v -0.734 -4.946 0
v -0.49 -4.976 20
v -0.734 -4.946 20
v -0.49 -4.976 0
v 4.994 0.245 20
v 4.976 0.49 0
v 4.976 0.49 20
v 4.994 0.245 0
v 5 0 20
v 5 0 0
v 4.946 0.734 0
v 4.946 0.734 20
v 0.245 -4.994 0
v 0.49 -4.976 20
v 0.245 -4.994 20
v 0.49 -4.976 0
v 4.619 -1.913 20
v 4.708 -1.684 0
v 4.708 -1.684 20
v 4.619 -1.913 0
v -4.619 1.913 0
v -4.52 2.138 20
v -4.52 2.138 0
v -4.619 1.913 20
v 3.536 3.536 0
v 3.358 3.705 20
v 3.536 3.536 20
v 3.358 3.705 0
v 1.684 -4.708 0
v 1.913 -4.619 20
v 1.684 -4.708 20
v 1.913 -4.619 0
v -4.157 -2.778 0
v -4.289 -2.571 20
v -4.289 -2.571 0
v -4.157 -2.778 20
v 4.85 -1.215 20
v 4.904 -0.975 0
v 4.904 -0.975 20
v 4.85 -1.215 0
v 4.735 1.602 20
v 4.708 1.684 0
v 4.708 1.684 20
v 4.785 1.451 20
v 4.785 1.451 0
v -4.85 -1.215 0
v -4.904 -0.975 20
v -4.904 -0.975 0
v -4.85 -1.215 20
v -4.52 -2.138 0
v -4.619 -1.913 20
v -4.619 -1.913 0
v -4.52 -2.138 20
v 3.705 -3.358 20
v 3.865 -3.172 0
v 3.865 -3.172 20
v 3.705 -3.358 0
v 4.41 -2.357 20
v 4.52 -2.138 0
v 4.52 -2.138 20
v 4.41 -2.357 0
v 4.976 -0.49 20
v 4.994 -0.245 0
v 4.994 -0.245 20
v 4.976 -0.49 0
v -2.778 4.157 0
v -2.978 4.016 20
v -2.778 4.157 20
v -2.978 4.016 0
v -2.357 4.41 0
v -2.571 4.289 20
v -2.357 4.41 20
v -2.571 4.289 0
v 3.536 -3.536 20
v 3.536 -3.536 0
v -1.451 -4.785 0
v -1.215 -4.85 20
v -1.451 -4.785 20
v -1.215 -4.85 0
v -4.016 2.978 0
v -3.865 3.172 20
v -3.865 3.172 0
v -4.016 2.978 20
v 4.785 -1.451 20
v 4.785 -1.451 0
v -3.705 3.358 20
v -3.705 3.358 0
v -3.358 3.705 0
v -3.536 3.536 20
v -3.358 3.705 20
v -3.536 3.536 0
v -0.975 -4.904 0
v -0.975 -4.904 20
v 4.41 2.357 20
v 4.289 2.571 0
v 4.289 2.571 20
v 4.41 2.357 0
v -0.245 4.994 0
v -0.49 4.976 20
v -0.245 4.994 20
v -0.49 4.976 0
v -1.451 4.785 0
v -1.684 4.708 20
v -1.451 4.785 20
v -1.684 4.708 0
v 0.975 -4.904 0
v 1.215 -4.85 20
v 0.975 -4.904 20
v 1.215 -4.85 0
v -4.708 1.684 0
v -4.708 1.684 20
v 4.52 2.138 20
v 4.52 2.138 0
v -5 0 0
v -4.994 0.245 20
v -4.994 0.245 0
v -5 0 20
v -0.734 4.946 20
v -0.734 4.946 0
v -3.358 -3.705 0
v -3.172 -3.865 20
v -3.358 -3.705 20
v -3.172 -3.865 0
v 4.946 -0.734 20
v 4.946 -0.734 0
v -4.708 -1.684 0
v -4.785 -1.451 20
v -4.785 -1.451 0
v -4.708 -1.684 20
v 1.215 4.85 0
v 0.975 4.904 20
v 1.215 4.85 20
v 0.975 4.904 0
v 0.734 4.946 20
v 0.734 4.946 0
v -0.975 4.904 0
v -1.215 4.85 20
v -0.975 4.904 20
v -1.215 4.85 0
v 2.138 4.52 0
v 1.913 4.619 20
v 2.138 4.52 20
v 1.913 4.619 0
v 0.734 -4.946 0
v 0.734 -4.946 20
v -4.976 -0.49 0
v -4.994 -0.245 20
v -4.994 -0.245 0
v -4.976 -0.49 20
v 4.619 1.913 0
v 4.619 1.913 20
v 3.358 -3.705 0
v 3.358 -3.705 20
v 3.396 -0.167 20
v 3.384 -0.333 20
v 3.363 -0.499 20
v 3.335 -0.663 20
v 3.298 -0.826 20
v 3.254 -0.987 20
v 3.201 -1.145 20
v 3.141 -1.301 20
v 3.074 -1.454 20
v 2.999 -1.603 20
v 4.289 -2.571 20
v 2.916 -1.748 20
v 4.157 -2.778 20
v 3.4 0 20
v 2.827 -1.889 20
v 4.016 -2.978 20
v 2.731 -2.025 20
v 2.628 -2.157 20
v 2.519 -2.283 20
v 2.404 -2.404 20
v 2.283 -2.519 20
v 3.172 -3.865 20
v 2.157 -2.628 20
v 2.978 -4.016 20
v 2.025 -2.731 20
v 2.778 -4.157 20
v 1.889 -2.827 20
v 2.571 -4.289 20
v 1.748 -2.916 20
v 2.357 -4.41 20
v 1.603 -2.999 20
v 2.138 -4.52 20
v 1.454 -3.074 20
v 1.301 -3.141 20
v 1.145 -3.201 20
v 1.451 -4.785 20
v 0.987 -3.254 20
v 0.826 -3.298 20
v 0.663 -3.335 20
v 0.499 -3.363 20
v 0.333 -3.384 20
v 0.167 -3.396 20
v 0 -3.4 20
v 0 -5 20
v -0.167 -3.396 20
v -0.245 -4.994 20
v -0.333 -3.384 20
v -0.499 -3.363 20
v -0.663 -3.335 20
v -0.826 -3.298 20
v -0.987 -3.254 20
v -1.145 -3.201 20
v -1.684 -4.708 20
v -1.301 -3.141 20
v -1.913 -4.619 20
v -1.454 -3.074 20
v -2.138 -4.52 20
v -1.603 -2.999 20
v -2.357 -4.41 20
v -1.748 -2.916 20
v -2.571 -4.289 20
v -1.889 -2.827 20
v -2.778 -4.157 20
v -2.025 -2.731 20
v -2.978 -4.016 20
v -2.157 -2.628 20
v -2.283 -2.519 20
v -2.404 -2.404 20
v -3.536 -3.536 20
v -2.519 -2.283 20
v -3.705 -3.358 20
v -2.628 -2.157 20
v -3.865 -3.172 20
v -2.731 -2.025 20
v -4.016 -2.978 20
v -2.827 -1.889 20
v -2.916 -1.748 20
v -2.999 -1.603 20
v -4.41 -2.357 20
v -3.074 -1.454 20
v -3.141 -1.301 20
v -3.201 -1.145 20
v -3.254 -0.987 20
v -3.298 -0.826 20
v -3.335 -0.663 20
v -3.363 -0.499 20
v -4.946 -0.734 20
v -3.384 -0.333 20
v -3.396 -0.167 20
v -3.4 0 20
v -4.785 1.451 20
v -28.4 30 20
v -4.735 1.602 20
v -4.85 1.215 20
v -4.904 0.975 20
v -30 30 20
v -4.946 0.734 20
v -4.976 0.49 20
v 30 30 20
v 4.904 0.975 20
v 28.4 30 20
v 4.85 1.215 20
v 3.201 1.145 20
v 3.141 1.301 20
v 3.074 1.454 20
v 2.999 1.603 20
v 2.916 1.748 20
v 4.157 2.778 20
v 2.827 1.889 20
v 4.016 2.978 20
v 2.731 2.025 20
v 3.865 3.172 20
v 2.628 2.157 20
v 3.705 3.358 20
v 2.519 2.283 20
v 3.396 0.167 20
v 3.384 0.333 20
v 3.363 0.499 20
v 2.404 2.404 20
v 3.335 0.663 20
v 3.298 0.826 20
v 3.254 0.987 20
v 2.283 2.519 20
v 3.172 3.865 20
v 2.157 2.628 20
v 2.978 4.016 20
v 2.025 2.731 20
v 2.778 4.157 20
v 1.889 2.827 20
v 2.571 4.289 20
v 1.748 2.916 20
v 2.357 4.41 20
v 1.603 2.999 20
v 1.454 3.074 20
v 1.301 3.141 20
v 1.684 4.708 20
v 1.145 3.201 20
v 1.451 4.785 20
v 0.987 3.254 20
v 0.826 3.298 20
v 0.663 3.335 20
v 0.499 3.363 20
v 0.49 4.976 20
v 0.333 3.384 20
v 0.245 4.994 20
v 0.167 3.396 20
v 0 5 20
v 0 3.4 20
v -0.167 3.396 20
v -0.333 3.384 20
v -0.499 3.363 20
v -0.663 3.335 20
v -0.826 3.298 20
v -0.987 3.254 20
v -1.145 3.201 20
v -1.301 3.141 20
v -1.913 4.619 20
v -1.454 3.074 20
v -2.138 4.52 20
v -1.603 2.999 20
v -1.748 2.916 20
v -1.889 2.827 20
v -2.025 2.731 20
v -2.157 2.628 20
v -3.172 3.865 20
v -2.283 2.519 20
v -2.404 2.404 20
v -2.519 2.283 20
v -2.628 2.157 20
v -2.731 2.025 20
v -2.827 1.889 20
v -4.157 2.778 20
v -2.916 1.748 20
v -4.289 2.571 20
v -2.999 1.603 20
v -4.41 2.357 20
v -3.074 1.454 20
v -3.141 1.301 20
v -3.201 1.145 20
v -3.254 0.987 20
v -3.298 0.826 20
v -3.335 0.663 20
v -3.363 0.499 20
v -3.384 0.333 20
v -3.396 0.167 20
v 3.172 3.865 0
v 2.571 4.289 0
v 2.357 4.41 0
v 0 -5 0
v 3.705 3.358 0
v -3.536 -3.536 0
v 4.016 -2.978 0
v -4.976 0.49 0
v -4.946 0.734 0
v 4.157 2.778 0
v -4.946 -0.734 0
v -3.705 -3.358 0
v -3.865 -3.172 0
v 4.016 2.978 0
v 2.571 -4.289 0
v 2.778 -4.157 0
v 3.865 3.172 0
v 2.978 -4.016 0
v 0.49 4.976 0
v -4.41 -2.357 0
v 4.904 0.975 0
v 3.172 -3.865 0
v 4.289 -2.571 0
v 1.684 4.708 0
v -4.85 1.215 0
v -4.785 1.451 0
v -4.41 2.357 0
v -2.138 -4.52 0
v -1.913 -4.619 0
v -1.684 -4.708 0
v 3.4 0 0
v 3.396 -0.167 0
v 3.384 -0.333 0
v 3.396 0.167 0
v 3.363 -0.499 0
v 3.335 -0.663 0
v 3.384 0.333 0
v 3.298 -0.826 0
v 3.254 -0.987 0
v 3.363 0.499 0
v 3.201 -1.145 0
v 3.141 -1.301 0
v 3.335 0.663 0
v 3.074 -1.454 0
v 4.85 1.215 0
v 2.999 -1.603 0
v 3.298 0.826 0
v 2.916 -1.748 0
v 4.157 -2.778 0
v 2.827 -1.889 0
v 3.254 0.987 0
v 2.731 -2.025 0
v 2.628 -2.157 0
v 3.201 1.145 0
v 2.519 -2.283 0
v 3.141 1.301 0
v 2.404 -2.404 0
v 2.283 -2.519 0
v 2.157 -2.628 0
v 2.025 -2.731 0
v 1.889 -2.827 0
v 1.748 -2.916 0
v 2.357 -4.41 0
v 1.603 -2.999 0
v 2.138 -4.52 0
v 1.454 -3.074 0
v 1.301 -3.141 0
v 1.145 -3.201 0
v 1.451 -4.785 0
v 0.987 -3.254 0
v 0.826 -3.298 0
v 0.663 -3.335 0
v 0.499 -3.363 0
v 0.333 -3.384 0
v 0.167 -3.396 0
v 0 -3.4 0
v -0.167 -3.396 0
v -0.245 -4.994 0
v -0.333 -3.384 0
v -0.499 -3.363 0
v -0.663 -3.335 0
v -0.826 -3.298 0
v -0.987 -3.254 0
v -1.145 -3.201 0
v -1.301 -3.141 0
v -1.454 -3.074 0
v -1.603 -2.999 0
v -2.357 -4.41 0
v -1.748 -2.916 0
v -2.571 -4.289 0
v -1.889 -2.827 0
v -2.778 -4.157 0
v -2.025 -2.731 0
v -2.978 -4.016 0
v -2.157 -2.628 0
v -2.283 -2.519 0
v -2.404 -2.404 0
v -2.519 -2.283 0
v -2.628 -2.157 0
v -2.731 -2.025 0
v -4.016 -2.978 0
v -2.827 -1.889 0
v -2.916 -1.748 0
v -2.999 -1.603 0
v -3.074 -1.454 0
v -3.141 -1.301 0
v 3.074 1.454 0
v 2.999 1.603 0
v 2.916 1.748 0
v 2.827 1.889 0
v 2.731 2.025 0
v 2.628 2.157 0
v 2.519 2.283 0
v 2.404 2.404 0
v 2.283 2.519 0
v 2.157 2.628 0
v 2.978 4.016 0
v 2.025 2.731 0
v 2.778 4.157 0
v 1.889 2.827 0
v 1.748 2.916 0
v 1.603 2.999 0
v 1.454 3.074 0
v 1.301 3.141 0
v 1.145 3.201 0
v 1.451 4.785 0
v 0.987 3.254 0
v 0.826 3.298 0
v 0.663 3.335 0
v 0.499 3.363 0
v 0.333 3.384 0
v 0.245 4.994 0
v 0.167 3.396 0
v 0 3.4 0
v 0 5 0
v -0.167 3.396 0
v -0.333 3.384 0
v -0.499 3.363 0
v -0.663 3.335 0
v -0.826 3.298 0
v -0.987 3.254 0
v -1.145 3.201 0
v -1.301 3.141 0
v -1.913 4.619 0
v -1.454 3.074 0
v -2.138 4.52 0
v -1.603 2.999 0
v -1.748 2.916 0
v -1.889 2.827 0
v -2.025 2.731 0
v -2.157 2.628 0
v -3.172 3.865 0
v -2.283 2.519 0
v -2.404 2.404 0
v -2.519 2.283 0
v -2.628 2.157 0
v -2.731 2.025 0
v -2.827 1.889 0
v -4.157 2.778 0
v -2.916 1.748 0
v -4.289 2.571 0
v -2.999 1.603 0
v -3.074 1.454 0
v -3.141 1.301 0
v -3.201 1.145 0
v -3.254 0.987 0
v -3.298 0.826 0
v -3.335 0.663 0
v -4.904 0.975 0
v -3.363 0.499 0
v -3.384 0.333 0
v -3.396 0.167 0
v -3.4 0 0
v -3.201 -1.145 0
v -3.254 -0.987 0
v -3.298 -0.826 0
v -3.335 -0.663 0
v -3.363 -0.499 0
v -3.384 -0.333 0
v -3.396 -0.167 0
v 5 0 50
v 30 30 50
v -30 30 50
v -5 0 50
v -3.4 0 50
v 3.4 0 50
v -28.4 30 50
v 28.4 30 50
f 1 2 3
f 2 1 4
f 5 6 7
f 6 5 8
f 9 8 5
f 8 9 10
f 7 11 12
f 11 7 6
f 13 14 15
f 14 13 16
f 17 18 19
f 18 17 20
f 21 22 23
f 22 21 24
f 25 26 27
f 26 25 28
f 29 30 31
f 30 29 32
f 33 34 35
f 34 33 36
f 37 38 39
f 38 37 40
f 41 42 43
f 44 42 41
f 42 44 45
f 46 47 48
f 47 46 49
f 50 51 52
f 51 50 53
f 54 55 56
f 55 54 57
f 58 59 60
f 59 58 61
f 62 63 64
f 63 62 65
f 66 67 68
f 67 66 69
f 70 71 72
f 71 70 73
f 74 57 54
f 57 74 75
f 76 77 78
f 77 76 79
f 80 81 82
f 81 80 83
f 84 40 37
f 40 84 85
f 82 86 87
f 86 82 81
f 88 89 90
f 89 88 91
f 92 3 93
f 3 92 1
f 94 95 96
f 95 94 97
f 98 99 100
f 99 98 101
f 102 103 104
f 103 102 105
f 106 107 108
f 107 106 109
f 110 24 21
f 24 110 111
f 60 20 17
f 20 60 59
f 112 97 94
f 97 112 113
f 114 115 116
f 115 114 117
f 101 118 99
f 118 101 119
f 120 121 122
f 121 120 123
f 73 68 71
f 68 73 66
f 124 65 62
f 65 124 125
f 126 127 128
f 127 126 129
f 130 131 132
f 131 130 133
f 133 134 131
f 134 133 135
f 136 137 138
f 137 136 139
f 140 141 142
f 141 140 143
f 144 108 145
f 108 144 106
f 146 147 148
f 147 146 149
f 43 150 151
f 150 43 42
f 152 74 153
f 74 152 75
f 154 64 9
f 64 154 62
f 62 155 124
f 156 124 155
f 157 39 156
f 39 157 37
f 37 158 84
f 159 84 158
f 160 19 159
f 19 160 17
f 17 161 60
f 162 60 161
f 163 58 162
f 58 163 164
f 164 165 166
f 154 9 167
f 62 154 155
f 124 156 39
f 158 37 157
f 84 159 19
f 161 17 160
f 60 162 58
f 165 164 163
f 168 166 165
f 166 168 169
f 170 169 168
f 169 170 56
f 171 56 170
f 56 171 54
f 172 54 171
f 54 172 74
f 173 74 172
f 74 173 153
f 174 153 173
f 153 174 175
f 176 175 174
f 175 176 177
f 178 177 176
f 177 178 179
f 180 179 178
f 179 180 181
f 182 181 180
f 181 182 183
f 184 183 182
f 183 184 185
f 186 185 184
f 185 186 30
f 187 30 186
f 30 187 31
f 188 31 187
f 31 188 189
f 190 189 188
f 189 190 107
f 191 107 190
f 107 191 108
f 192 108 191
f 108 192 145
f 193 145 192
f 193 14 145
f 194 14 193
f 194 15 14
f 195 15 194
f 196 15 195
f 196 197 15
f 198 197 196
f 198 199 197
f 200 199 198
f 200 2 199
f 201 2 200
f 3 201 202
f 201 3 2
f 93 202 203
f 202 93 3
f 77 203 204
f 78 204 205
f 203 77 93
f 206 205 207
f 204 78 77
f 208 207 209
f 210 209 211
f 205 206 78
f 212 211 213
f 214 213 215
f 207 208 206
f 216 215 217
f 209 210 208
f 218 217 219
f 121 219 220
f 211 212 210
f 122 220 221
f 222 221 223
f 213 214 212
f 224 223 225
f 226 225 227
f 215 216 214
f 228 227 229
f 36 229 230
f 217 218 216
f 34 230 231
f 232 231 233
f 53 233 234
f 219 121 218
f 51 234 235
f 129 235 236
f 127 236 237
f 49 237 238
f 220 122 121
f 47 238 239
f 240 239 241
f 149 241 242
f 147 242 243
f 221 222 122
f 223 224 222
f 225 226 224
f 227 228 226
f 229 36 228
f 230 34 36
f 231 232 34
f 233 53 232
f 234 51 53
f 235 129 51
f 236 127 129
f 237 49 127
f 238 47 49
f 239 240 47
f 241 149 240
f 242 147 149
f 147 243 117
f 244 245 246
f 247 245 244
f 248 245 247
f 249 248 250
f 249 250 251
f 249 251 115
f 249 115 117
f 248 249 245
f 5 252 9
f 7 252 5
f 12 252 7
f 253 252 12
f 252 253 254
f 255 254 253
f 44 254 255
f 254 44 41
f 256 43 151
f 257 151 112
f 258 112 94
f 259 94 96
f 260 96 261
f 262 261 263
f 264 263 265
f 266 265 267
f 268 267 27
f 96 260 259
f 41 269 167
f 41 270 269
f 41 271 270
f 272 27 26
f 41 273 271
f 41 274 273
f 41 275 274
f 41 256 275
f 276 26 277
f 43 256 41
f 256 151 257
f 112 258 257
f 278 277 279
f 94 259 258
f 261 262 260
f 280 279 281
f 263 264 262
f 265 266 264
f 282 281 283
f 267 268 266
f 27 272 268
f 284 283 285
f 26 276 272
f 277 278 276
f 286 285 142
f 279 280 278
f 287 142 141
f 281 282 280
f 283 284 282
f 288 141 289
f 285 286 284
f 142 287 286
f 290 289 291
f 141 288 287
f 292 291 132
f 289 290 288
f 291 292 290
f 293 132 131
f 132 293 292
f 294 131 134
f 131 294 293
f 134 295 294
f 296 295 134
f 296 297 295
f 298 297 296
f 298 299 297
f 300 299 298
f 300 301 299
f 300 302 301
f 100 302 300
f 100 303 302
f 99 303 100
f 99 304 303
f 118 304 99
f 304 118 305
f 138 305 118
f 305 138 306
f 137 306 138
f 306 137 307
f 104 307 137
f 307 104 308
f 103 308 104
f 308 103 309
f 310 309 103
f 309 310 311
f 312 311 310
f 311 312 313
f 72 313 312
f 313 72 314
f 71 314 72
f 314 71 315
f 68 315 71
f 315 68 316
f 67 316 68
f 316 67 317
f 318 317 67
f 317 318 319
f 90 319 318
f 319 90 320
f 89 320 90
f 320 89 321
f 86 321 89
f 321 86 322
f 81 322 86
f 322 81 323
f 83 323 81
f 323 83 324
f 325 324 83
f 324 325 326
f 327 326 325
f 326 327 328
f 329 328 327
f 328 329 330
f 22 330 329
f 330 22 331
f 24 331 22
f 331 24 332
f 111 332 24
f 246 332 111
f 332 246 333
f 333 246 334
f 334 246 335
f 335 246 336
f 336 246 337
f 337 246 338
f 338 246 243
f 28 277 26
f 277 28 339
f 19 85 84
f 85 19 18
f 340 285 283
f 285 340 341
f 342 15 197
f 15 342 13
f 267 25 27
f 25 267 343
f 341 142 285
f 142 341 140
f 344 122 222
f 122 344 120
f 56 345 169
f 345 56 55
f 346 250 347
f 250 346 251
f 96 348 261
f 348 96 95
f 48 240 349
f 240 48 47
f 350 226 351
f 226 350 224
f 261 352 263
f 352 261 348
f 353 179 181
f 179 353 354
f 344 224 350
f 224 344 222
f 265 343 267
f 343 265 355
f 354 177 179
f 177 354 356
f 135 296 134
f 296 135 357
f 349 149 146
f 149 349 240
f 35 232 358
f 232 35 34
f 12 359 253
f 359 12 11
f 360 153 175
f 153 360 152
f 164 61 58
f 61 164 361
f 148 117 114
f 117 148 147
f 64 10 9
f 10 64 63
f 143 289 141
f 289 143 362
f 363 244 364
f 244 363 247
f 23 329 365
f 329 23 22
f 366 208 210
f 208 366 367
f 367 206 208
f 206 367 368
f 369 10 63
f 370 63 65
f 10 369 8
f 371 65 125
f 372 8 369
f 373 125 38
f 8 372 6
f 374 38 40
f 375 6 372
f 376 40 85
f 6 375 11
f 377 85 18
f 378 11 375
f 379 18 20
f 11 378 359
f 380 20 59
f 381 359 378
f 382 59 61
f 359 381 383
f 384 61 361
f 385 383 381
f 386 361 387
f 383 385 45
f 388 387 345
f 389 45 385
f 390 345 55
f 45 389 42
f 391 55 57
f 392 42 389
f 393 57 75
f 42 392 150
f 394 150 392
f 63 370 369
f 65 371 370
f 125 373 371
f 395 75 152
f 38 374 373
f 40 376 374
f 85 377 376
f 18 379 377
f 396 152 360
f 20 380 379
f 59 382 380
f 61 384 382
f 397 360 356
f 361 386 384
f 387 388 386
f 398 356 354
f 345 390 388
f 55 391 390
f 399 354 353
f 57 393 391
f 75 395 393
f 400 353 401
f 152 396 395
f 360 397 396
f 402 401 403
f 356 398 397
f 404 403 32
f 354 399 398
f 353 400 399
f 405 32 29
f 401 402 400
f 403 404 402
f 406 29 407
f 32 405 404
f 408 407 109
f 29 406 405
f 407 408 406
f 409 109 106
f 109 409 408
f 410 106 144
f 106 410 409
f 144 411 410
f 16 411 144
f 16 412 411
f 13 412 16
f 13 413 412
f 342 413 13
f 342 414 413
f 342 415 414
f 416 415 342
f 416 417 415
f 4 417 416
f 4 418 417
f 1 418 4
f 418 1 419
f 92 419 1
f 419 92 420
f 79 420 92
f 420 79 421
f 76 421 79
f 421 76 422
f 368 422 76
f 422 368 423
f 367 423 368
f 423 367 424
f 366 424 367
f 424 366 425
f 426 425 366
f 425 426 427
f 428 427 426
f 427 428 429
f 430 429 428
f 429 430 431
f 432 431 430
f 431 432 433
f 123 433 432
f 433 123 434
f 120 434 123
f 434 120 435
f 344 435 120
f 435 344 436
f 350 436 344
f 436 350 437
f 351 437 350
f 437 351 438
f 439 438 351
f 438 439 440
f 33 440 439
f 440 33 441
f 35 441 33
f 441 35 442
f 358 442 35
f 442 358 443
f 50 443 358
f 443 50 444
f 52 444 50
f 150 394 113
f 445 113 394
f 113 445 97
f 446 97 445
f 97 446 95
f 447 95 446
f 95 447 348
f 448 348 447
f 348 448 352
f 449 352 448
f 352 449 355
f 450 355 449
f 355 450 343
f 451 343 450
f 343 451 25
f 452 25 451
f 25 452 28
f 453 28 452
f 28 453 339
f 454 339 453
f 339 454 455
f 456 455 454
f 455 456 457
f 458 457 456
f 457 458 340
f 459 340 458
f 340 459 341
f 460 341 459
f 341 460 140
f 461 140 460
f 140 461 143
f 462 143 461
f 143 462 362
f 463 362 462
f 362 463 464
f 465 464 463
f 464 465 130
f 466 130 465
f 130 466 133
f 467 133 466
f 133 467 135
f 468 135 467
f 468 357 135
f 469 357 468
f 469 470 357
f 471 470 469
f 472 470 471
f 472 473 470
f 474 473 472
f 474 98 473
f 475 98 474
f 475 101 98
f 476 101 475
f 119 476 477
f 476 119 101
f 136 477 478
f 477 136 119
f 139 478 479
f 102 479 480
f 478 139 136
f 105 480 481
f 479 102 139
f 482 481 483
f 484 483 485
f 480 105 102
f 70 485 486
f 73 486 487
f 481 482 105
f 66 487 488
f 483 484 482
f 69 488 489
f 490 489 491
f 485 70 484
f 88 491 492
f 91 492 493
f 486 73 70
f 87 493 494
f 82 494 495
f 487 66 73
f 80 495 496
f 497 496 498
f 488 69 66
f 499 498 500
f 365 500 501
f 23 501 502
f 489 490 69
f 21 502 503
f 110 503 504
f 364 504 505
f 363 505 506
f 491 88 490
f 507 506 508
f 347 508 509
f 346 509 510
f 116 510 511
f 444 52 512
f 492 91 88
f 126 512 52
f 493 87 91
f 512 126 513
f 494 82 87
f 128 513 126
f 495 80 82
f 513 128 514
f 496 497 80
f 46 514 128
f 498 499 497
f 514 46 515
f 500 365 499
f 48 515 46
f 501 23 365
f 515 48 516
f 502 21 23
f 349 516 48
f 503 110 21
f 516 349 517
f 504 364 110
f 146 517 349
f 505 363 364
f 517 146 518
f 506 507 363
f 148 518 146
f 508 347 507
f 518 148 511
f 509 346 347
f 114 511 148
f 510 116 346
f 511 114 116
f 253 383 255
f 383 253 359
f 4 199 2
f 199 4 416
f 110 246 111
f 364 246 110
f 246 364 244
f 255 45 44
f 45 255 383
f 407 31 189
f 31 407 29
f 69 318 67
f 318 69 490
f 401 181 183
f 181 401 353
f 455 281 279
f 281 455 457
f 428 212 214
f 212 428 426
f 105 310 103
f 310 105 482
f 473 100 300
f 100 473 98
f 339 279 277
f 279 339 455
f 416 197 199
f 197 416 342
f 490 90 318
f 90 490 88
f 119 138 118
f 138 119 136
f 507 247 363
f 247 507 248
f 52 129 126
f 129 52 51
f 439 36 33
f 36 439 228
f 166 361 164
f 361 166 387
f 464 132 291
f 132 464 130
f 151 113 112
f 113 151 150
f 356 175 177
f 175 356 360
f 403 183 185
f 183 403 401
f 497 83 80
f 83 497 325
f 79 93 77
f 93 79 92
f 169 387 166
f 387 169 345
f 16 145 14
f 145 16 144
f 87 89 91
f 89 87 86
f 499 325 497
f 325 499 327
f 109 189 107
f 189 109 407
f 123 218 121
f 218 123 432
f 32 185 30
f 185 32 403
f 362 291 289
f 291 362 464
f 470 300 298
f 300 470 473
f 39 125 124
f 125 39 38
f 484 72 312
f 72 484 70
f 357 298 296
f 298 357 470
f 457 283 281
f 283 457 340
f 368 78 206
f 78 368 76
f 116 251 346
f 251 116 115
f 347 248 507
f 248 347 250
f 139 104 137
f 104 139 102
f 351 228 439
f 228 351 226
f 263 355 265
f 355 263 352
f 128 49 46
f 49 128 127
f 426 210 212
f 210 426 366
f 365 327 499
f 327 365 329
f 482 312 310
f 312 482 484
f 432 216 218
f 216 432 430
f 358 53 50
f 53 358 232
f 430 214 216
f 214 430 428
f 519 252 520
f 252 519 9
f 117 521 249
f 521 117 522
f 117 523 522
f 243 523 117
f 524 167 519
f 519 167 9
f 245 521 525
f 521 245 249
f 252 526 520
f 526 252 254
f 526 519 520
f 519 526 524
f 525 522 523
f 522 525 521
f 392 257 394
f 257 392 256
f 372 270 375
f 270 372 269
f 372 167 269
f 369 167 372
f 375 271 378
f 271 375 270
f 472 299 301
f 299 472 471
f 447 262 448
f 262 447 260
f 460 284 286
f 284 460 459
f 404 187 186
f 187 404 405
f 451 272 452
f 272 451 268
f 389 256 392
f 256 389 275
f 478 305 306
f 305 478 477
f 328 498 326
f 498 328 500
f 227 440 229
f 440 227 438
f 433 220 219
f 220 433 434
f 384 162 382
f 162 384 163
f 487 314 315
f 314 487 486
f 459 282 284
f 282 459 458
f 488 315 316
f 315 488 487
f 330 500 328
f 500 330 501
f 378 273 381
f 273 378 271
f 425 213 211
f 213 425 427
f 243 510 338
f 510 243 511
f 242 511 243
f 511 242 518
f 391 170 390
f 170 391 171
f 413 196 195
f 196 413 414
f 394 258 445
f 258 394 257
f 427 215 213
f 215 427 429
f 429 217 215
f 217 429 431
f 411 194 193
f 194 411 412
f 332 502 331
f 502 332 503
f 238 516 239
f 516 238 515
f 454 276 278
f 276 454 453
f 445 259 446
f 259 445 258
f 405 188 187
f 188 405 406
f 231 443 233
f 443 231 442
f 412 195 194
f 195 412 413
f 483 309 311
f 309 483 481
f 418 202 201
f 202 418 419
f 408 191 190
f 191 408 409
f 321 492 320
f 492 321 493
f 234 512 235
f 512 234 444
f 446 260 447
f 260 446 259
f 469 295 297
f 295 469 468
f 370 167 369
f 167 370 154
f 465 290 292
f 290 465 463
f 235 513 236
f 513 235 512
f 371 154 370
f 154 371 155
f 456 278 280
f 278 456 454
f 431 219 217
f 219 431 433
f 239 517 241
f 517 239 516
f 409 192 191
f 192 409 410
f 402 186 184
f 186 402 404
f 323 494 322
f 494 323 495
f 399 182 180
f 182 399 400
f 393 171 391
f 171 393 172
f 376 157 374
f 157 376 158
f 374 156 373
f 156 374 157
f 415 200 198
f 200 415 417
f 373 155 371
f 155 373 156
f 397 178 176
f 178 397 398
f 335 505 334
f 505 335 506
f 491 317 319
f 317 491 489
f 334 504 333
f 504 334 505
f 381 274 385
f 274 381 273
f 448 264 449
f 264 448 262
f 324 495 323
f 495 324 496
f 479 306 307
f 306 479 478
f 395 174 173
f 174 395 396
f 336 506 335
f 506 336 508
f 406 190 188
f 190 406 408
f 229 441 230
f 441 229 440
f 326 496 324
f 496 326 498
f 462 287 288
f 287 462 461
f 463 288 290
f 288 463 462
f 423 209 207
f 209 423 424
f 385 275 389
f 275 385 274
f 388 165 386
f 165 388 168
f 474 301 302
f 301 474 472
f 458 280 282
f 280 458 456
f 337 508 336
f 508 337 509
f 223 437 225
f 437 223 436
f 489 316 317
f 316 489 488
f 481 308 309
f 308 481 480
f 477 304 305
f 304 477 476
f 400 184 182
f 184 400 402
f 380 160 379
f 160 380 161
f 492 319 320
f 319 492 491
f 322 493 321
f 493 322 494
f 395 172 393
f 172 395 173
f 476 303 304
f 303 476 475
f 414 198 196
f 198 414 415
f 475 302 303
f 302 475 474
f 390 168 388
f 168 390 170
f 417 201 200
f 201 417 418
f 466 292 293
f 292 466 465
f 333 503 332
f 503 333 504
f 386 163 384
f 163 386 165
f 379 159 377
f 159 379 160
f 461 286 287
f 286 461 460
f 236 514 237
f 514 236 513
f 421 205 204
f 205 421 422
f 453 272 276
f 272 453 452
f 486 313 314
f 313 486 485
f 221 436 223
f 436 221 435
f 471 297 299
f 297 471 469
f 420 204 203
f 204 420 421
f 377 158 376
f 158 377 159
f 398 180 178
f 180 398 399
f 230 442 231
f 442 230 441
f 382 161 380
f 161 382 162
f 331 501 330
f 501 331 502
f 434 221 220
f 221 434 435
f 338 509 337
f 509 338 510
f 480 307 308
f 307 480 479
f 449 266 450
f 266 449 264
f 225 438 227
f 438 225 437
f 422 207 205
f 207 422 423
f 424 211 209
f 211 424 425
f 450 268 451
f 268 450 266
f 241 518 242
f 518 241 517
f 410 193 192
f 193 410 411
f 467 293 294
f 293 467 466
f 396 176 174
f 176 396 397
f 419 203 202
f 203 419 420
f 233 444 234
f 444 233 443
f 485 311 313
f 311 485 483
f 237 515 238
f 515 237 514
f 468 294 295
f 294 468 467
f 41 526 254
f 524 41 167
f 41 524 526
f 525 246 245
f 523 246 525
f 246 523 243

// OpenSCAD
// Lab Funnel Design
// Units: millimetres
// Orientation: Upright, wide opening at top, rests on XY plane at z=0

// Dimensions
$fn = 128; // High resolution for smooth curves and accurate hole sizes

// Spout (Tube)
spout_outer_diameter = 10;
spout_inner_diameter = 6.8; // 10 - 2*1.6
spout_length = 20;
spout_wall_thickness = 1.6;

// Cone (Funnel)
cone_bottom_diameter = 10; // Matches spout outer diameter
cone_top_diameter = 60;
cone_bottom_z = 20; // Start of cone
cone_top_z = 50;    // End of cone (rim)
cone_wall_thickness = 1.6;

// Derived Cone Dimensions
cone_bottom_radius = cone_bottom_diameter / 2;
cone_top_radius = cone_top_diameter / 2;
cone_height = cone_top_z - cone_bottom_z;

// Main Body Construction
// We build the solid from the bottom up.
// 1. The Spout: A hollow cylinder from z=0 to z=20.
// 2. The Cone: A hollow frustum from z=20 to z=50.
// We use a single difference operation to cut the inner bore through both sections.

difference() {
    union() {
        // --- Outer Shell ---
        
        // 1. Spout Outer Cylinder
        translate([0, 0, 0])
            cylinder(
                h = spout_length,
                d = spout_outer_diameter,
                center = false
            );
        
        // 2. Cone Outer Frustum
        // The cone starts at z=20. We translate it so its bottom is at z=20.
        translate([0, 0, cone_bottom_z])
            linear_extrude(height = cone_height, center = false)
                polygon(
                    points = [
                        [-cone_bottom_radius, 0],
                        [cone_bottom_radius, 0],
                        [cone_top_radius, cone_height],
                        [-cone_top_radius, cone_height]
                    ]
                );
    }
    
    // --- Inner Bore (Cutout) ---
    // We cut a single continuous path for the liquid to flow through.
    // The path consists of the spout bore (cylinder) and the cone bore (frustum).
    
    union() {
        // 1. Spout Inner Cylinder
        translate([0, 0, 0])
            cylinder(
                h = spout_length,
                d = spout_inner_diameter,
                center = false
            );
        
        // 2. Cone Inner Frustum
        // The inner cone starts at z=20.
        // Inner bottom radius = (spout_inner_diameter / 2)
        // Inner top radius = (cone_top_diameter / 2) - cone_wall_thickness
        // Note: The user specified the wall is 1.6mm everywhere.
        // So at the top rim (z=50), the inner diameter is 60 - 2*1.6 = 56.8mm.
        // At the bottom of the cone (z=20), the inner diameter matches the spout inner diameter (6.8mm).
        
        inner_cone_bottom_radius = spout_inner_diameter / 2;
        inner_cone_top_radius = (cone_top_diameter / 2) - cone_wall_thickness;
        
        translate([0, 0, cone_bottom_z])
            linear_extrude(height = cone_height, center = false)
                polygon(
                    points = [
                        [-inner_cone_bottom_radius, 0],
                        [inner_cone_bottom_radius, 0],
                        [inner_cone_top_radius, cone_height],
                        [-inner_cone_top_radius, cone_height]
                    ]
                );
    }
}
